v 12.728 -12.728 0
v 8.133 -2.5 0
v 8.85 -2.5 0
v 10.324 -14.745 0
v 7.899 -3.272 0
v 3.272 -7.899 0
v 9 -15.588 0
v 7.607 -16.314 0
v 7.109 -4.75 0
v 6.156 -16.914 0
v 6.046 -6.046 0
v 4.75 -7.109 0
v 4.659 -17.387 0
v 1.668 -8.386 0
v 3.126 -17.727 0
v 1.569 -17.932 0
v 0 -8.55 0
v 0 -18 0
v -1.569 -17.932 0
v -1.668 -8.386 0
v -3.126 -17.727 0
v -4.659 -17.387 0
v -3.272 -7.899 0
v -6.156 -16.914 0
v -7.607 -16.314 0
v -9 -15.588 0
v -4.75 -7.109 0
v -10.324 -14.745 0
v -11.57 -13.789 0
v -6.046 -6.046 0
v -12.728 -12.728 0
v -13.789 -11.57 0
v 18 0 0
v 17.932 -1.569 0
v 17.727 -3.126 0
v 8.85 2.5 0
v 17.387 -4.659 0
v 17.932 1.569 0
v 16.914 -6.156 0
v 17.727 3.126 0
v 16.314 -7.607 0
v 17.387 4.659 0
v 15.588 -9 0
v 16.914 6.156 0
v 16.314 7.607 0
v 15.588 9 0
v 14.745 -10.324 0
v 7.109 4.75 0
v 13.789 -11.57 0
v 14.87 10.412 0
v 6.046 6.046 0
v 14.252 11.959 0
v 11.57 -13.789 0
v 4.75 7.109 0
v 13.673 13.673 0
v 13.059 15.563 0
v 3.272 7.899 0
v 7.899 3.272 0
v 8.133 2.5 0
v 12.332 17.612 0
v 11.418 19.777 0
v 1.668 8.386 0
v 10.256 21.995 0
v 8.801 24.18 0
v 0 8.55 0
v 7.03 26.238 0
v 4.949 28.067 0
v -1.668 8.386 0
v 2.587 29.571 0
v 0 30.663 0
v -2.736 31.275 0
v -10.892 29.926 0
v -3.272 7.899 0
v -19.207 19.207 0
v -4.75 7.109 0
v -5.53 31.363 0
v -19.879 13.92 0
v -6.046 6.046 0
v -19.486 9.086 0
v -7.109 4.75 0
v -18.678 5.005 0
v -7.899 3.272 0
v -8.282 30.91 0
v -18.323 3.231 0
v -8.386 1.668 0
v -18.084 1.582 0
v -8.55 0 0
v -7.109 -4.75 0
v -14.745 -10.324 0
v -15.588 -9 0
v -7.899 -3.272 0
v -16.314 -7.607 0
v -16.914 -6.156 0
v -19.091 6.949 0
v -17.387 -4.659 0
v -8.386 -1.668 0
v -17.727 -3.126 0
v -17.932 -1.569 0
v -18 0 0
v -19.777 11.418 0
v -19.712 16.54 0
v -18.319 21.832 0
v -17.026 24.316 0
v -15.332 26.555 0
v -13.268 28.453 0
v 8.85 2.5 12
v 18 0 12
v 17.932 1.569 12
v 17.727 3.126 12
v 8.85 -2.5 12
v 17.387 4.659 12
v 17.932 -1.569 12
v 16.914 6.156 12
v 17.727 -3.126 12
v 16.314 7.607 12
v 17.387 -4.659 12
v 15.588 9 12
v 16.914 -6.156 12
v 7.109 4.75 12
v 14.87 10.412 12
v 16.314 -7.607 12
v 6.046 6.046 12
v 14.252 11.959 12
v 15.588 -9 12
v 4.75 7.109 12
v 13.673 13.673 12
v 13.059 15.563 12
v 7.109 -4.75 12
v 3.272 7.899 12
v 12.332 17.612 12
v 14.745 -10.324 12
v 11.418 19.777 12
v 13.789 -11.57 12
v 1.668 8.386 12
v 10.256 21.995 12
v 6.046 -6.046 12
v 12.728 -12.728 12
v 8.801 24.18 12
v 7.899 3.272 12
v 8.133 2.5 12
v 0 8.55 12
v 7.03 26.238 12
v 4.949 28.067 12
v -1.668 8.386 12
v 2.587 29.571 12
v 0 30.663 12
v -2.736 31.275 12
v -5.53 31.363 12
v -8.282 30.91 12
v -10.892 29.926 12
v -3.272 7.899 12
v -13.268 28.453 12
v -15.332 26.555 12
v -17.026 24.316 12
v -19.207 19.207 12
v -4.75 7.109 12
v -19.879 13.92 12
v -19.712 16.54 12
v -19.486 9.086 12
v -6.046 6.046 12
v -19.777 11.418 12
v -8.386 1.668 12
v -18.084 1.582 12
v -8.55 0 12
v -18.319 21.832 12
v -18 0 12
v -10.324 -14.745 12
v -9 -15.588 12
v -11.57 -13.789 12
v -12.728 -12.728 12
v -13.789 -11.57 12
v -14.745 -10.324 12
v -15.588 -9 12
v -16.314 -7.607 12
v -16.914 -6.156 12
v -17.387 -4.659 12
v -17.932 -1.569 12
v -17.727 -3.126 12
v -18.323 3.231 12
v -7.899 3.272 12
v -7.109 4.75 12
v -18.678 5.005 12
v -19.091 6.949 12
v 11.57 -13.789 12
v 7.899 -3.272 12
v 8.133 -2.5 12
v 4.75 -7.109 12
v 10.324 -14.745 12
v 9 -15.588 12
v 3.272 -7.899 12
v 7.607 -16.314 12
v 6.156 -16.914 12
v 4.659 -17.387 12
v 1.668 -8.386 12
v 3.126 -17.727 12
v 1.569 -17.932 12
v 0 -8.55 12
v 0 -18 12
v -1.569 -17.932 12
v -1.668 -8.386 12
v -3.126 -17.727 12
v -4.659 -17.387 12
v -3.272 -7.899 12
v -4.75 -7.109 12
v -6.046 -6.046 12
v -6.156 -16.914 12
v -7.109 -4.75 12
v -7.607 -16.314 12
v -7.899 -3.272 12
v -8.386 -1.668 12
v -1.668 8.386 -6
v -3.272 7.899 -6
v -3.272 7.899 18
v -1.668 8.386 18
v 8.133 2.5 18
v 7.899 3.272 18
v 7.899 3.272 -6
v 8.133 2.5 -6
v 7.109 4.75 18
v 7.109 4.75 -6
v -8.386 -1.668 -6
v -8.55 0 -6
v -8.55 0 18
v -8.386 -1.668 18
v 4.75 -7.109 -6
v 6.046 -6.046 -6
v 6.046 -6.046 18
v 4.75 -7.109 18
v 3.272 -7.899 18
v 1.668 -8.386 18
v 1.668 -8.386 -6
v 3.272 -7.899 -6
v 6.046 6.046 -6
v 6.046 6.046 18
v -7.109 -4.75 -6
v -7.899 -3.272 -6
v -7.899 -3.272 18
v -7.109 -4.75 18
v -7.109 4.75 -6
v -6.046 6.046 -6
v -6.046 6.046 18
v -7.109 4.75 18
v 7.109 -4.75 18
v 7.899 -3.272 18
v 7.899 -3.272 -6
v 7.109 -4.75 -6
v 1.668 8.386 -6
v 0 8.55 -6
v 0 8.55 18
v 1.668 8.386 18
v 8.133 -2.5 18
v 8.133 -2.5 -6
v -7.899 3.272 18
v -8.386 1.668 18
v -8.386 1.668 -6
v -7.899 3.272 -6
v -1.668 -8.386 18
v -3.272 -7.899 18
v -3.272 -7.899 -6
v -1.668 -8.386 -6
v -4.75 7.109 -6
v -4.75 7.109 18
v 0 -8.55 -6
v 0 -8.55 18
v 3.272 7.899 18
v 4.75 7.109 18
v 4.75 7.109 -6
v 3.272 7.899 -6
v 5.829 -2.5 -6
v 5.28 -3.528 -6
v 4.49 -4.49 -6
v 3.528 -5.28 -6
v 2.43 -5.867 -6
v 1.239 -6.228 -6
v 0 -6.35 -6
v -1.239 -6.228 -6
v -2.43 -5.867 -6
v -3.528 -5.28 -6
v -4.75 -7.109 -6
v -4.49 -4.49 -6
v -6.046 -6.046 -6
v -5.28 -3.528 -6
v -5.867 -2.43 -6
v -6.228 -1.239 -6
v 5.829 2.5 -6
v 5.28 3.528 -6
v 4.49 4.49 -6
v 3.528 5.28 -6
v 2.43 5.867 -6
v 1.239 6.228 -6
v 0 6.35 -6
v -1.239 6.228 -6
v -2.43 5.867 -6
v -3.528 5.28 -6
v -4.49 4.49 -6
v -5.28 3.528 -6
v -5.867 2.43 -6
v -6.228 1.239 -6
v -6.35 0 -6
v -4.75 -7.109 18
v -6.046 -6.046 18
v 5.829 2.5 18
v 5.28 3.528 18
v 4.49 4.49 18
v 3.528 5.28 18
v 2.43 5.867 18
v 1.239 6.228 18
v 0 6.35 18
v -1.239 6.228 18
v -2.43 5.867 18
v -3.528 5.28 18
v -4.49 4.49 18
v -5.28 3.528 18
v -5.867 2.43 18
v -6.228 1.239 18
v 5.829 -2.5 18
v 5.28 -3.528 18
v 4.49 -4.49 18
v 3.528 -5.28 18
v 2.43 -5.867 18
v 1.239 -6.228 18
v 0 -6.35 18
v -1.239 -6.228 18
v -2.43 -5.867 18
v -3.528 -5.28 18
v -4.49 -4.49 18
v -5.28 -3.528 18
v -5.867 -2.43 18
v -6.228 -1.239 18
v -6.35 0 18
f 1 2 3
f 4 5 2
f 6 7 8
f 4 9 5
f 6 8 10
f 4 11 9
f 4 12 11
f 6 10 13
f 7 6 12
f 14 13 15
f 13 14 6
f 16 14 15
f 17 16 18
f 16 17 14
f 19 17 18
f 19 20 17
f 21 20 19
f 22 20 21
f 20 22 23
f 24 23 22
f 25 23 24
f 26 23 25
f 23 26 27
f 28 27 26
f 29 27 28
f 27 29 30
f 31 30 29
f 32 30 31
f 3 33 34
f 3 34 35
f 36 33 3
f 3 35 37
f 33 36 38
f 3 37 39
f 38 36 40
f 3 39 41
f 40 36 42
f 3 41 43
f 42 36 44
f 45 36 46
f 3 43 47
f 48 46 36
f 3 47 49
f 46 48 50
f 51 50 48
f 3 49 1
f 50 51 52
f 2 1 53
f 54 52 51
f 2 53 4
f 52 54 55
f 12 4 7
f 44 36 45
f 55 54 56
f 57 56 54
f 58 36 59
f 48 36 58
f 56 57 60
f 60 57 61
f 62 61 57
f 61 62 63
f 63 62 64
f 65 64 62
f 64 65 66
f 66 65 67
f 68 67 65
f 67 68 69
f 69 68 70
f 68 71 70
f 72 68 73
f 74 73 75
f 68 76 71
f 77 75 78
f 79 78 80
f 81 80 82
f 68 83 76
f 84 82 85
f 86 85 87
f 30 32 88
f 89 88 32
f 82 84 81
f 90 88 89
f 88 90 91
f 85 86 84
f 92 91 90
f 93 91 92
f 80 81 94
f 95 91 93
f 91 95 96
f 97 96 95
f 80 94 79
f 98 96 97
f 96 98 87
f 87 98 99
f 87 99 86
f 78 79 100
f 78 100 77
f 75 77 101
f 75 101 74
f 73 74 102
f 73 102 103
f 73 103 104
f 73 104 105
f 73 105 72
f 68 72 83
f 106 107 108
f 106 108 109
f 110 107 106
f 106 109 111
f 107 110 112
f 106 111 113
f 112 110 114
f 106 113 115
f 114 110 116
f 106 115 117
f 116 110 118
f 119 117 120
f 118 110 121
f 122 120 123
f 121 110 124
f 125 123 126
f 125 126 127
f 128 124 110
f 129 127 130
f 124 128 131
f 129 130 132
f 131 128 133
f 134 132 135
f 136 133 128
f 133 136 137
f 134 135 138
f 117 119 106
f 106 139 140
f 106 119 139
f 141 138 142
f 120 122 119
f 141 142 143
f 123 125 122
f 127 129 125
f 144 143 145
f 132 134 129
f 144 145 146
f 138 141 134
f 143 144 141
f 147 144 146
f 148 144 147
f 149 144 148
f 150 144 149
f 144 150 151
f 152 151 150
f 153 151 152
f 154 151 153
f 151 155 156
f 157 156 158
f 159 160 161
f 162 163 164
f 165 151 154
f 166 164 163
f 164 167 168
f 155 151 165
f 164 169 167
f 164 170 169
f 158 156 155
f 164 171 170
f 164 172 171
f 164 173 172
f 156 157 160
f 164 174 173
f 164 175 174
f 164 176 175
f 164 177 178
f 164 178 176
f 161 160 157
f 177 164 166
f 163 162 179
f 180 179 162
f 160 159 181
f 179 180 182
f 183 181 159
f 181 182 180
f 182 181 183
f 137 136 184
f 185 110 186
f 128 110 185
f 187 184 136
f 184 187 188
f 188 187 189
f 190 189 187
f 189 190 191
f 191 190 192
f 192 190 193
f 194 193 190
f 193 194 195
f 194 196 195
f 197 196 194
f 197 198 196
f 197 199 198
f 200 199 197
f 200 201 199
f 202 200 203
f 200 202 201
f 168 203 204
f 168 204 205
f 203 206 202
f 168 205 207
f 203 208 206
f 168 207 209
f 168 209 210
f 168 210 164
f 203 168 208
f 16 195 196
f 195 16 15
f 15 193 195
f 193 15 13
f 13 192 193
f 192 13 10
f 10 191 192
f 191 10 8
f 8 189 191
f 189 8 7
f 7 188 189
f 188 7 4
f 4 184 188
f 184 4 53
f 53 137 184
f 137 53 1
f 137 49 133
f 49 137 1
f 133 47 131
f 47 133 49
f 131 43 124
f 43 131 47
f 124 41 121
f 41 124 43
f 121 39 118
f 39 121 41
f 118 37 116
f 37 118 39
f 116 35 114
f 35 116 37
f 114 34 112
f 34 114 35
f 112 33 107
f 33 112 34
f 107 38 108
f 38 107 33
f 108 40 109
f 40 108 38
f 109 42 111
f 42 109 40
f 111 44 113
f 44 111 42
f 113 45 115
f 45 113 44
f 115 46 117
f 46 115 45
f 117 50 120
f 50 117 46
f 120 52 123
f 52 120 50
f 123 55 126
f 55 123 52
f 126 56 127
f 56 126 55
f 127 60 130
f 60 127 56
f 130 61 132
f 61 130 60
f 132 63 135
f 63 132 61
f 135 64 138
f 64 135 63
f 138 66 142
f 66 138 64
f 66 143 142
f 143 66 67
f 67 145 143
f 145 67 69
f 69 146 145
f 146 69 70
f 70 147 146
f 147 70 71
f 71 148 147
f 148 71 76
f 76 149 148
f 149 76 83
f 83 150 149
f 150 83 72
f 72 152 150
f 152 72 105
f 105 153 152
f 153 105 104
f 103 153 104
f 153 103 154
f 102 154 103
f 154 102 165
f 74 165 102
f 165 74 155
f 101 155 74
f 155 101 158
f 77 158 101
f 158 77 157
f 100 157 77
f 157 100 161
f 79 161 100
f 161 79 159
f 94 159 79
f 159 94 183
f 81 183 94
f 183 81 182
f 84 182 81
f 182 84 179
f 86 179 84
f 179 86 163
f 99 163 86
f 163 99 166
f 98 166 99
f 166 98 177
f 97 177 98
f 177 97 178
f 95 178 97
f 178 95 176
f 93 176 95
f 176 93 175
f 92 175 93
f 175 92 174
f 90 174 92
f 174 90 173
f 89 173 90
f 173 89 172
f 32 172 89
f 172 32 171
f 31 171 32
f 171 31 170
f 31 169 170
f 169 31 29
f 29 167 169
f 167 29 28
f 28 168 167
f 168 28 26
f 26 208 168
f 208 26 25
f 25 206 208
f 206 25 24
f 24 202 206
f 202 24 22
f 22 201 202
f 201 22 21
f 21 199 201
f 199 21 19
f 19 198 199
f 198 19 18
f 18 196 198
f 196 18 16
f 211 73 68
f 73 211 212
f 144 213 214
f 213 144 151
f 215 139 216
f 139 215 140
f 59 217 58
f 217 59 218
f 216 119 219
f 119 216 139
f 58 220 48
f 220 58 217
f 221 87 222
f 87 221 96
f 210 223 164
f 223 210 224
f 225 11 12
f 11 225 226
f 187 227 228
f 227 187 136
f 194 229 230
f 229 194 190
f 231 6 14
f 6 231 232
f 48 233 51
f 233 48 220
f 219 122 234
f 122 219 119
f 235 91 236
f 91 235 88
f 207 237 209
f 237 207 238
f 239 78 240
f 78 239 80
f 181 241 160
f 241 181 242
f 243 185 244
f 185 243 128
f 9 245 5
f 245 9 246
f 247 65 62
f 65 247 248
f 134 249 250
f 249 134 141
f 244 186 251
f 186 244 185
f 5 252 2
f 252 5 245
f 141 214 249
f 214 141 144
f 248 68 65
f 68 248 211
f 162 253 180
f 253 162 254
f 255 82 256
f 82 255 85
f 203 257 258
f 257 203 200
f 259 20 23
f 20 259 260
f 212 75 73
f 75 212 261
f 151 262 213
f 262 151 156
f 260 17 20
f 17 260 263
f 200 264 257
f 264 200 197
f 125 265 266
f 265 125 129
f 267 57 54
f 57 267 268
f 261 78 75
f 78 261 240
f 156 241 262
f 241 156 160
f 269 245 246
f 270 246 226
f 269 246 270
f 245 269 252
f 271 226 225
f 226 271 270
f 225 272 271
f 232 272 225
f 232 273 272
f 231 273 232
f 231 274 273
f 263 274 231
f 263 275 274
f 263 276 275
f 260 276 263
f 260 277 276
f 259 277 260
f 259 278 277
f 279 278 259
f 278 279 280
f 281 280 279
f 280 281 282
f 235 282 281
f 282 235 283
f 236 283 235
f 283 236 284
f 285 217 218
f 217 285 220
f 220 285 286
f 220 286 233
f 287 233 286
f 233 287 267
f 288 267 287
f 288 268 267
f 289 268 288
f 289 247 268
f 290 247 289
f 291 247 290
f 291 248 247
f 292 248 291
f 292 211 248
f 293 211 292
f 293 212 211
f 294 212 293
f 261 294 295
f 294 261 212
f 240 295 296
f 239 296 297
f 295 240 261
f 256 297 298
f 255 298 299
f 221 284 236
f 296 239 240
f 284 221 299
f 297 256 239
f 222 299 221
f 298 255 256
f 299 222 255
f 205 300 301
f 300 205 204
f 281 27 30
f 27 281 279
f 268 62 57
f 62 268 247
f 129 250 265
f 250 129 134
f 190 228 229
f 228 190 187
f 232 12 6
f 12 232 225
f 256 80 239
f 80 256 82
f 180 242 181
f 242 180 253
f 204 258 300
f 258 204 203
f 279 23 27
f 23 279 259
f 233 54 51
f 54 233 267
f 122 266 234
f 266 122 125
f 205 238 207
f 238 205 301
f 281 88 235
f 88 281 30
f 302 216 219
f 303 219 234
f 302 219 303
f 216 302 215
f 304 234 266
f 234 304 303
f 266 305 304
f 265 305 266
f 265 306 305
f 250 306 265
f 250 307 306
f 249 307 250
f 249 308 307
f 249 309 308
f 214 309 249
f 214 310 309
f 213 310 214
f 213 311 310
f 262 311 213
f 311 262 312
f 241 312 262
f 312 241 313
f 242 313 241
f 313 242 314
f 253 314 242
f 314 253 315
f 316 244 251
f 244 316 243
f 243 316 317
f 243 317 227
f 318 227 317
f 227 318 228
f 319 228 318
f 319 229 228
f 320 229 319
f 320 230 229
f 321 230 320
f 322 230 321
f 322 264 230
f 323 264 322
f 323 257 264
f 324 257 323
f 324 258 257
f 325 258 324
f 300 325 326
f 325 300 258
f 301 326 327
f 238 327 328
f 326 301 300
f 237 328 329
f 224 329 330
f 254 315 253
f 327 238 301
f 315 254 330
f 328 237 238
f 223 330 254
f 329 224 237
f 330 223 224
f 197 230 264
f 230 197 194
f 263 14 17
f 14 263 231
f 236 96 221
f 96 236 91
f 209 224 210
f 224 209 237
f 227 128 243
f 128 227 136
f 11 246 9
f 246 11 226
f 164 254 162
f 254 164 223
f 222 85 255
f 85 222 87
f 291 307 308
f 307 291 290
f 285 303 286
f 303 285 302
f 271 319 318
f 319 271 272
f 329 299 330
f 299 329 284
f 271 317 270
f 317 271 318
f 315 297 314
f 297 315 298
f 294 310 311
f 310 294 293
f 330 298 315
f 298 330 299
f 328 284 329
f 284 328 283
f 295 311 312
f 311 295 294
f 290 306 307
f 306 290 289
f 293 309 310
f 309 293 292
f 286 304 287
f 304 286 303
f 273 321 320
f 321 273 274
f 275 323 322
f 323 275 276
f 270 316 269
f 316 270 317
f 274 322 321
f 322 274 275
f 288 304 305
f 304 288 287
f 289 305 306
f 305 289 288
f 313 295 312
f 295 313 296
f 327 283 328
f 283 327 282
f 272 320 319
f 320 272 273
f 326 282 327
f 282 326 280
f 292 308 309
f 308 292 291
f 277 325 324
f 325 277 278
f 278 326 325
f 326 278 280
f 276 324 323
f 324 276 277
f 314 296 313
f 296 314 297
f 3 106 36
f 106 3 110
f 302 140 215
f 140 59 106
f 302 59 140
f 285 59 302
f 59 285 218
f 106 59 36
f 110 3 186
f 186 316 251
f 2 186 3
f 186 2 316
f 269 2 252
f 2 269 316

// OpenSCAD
$fn = 32;

// ----------------------------------------------------------------------
// Cam: base radius 18 mm with a 14 mm lift over 150 degrees
// ----------------------------------------------------------------------

// --- parameters (mm) ---
base_r = 18;              // base radius
lift = 14;                // lift height above the base radius
lift_span = 150;          // angular width of the lift
lift_start = 30;          // angle where the lift starts
cam_t = 12;               // cam plate thickness
hub_d = 17.1;             // hub diameter
hub_h = 24;               // hub height
bore_d = 12.7;            // bore
key_w = 5;                // keyway width
key_depth = 1.6;          // keyway depth

cam_profile = [[18, 0], [17.932, 1.569], [17.727, 3.126], [17.387, 4.659], [16.914, 6.156], [16.314, 7.607], [15.588, 9], [14.87, 10.412], [14.252, 11.959], [13.673, 13.673], [13.059, 15.563], [12.332, 17.612], [11.418, 19.777], [10.256, 21.995], [8.801, 24.18], [7.03, 26.238], [4.949, 28.067], [2.587, 29.571], [0, 30.663], [-2.736, 31.275], [-5.53, 31.363], [-8.282, 30.91], [-10.892, 29.926], [-13.268, 28.453], [-15.332, 26.555], [-17.026, 24.316], [-18.319, 21.832], [-19.207, 19.207], [-19.712, 16.54], [-19.879, 13.92], [-19.777, 11.418], [-19.486, 9.086], [-19.091, 6.949], [-18.678, 5.005], [-18.323, 3.231], [-18.084, 1.582], [-18, 0], [-17.932, -1.569], [-17.727, -3.126], [-17.387, -4.659], [-16.914, -6.156], [-16.314, -7.607], [-15.588, -9], [-14.745, -10.324], [-13.789, -11.57], [-12.728, -12.728], [-11.57, -13.789], [-10.324, -14.745], [-9, -15.588], [-7.607, -16.314], [-6.156, -16.914], [-4.659, -17.387], [-3.126, -17.727], [-1.569, -17.932], [0, -18], [1.569, -17.932], [3.126, -17.727], [4.659, -17.387], [6.156, -16.914], [7.607, -16.314], [9, -15.588], [10.324, -14.745], [11.57, -13.789], [12.728, -12.728], [13.789, -11.57], [14.745, -10.324], [15.588, -9], [16.314, -7.607], [16.914, -6.156], [17.387, -4.659], [17.727, -3.126], [17.932, -1.569]];

difference() {
  union() {
    linear_extrude(height = cam_t) polygon(cam_profile);
    /* hub, proud of the cam plate on both sides */
    translate([0, 0, -6]) cylinder(h = hub_h, d = hub_d);
  }
  /* bore through the hub, 2.5 mm clear on both faces */
  translate([0, 0, -8.5]) cylinder(h = hub_h + 5, d = bore_d);
  /* keyway, milled through the whole hub */
  translate([4.75, -2.5, -8.5]) cube([4.1, 5, 29]);
}
